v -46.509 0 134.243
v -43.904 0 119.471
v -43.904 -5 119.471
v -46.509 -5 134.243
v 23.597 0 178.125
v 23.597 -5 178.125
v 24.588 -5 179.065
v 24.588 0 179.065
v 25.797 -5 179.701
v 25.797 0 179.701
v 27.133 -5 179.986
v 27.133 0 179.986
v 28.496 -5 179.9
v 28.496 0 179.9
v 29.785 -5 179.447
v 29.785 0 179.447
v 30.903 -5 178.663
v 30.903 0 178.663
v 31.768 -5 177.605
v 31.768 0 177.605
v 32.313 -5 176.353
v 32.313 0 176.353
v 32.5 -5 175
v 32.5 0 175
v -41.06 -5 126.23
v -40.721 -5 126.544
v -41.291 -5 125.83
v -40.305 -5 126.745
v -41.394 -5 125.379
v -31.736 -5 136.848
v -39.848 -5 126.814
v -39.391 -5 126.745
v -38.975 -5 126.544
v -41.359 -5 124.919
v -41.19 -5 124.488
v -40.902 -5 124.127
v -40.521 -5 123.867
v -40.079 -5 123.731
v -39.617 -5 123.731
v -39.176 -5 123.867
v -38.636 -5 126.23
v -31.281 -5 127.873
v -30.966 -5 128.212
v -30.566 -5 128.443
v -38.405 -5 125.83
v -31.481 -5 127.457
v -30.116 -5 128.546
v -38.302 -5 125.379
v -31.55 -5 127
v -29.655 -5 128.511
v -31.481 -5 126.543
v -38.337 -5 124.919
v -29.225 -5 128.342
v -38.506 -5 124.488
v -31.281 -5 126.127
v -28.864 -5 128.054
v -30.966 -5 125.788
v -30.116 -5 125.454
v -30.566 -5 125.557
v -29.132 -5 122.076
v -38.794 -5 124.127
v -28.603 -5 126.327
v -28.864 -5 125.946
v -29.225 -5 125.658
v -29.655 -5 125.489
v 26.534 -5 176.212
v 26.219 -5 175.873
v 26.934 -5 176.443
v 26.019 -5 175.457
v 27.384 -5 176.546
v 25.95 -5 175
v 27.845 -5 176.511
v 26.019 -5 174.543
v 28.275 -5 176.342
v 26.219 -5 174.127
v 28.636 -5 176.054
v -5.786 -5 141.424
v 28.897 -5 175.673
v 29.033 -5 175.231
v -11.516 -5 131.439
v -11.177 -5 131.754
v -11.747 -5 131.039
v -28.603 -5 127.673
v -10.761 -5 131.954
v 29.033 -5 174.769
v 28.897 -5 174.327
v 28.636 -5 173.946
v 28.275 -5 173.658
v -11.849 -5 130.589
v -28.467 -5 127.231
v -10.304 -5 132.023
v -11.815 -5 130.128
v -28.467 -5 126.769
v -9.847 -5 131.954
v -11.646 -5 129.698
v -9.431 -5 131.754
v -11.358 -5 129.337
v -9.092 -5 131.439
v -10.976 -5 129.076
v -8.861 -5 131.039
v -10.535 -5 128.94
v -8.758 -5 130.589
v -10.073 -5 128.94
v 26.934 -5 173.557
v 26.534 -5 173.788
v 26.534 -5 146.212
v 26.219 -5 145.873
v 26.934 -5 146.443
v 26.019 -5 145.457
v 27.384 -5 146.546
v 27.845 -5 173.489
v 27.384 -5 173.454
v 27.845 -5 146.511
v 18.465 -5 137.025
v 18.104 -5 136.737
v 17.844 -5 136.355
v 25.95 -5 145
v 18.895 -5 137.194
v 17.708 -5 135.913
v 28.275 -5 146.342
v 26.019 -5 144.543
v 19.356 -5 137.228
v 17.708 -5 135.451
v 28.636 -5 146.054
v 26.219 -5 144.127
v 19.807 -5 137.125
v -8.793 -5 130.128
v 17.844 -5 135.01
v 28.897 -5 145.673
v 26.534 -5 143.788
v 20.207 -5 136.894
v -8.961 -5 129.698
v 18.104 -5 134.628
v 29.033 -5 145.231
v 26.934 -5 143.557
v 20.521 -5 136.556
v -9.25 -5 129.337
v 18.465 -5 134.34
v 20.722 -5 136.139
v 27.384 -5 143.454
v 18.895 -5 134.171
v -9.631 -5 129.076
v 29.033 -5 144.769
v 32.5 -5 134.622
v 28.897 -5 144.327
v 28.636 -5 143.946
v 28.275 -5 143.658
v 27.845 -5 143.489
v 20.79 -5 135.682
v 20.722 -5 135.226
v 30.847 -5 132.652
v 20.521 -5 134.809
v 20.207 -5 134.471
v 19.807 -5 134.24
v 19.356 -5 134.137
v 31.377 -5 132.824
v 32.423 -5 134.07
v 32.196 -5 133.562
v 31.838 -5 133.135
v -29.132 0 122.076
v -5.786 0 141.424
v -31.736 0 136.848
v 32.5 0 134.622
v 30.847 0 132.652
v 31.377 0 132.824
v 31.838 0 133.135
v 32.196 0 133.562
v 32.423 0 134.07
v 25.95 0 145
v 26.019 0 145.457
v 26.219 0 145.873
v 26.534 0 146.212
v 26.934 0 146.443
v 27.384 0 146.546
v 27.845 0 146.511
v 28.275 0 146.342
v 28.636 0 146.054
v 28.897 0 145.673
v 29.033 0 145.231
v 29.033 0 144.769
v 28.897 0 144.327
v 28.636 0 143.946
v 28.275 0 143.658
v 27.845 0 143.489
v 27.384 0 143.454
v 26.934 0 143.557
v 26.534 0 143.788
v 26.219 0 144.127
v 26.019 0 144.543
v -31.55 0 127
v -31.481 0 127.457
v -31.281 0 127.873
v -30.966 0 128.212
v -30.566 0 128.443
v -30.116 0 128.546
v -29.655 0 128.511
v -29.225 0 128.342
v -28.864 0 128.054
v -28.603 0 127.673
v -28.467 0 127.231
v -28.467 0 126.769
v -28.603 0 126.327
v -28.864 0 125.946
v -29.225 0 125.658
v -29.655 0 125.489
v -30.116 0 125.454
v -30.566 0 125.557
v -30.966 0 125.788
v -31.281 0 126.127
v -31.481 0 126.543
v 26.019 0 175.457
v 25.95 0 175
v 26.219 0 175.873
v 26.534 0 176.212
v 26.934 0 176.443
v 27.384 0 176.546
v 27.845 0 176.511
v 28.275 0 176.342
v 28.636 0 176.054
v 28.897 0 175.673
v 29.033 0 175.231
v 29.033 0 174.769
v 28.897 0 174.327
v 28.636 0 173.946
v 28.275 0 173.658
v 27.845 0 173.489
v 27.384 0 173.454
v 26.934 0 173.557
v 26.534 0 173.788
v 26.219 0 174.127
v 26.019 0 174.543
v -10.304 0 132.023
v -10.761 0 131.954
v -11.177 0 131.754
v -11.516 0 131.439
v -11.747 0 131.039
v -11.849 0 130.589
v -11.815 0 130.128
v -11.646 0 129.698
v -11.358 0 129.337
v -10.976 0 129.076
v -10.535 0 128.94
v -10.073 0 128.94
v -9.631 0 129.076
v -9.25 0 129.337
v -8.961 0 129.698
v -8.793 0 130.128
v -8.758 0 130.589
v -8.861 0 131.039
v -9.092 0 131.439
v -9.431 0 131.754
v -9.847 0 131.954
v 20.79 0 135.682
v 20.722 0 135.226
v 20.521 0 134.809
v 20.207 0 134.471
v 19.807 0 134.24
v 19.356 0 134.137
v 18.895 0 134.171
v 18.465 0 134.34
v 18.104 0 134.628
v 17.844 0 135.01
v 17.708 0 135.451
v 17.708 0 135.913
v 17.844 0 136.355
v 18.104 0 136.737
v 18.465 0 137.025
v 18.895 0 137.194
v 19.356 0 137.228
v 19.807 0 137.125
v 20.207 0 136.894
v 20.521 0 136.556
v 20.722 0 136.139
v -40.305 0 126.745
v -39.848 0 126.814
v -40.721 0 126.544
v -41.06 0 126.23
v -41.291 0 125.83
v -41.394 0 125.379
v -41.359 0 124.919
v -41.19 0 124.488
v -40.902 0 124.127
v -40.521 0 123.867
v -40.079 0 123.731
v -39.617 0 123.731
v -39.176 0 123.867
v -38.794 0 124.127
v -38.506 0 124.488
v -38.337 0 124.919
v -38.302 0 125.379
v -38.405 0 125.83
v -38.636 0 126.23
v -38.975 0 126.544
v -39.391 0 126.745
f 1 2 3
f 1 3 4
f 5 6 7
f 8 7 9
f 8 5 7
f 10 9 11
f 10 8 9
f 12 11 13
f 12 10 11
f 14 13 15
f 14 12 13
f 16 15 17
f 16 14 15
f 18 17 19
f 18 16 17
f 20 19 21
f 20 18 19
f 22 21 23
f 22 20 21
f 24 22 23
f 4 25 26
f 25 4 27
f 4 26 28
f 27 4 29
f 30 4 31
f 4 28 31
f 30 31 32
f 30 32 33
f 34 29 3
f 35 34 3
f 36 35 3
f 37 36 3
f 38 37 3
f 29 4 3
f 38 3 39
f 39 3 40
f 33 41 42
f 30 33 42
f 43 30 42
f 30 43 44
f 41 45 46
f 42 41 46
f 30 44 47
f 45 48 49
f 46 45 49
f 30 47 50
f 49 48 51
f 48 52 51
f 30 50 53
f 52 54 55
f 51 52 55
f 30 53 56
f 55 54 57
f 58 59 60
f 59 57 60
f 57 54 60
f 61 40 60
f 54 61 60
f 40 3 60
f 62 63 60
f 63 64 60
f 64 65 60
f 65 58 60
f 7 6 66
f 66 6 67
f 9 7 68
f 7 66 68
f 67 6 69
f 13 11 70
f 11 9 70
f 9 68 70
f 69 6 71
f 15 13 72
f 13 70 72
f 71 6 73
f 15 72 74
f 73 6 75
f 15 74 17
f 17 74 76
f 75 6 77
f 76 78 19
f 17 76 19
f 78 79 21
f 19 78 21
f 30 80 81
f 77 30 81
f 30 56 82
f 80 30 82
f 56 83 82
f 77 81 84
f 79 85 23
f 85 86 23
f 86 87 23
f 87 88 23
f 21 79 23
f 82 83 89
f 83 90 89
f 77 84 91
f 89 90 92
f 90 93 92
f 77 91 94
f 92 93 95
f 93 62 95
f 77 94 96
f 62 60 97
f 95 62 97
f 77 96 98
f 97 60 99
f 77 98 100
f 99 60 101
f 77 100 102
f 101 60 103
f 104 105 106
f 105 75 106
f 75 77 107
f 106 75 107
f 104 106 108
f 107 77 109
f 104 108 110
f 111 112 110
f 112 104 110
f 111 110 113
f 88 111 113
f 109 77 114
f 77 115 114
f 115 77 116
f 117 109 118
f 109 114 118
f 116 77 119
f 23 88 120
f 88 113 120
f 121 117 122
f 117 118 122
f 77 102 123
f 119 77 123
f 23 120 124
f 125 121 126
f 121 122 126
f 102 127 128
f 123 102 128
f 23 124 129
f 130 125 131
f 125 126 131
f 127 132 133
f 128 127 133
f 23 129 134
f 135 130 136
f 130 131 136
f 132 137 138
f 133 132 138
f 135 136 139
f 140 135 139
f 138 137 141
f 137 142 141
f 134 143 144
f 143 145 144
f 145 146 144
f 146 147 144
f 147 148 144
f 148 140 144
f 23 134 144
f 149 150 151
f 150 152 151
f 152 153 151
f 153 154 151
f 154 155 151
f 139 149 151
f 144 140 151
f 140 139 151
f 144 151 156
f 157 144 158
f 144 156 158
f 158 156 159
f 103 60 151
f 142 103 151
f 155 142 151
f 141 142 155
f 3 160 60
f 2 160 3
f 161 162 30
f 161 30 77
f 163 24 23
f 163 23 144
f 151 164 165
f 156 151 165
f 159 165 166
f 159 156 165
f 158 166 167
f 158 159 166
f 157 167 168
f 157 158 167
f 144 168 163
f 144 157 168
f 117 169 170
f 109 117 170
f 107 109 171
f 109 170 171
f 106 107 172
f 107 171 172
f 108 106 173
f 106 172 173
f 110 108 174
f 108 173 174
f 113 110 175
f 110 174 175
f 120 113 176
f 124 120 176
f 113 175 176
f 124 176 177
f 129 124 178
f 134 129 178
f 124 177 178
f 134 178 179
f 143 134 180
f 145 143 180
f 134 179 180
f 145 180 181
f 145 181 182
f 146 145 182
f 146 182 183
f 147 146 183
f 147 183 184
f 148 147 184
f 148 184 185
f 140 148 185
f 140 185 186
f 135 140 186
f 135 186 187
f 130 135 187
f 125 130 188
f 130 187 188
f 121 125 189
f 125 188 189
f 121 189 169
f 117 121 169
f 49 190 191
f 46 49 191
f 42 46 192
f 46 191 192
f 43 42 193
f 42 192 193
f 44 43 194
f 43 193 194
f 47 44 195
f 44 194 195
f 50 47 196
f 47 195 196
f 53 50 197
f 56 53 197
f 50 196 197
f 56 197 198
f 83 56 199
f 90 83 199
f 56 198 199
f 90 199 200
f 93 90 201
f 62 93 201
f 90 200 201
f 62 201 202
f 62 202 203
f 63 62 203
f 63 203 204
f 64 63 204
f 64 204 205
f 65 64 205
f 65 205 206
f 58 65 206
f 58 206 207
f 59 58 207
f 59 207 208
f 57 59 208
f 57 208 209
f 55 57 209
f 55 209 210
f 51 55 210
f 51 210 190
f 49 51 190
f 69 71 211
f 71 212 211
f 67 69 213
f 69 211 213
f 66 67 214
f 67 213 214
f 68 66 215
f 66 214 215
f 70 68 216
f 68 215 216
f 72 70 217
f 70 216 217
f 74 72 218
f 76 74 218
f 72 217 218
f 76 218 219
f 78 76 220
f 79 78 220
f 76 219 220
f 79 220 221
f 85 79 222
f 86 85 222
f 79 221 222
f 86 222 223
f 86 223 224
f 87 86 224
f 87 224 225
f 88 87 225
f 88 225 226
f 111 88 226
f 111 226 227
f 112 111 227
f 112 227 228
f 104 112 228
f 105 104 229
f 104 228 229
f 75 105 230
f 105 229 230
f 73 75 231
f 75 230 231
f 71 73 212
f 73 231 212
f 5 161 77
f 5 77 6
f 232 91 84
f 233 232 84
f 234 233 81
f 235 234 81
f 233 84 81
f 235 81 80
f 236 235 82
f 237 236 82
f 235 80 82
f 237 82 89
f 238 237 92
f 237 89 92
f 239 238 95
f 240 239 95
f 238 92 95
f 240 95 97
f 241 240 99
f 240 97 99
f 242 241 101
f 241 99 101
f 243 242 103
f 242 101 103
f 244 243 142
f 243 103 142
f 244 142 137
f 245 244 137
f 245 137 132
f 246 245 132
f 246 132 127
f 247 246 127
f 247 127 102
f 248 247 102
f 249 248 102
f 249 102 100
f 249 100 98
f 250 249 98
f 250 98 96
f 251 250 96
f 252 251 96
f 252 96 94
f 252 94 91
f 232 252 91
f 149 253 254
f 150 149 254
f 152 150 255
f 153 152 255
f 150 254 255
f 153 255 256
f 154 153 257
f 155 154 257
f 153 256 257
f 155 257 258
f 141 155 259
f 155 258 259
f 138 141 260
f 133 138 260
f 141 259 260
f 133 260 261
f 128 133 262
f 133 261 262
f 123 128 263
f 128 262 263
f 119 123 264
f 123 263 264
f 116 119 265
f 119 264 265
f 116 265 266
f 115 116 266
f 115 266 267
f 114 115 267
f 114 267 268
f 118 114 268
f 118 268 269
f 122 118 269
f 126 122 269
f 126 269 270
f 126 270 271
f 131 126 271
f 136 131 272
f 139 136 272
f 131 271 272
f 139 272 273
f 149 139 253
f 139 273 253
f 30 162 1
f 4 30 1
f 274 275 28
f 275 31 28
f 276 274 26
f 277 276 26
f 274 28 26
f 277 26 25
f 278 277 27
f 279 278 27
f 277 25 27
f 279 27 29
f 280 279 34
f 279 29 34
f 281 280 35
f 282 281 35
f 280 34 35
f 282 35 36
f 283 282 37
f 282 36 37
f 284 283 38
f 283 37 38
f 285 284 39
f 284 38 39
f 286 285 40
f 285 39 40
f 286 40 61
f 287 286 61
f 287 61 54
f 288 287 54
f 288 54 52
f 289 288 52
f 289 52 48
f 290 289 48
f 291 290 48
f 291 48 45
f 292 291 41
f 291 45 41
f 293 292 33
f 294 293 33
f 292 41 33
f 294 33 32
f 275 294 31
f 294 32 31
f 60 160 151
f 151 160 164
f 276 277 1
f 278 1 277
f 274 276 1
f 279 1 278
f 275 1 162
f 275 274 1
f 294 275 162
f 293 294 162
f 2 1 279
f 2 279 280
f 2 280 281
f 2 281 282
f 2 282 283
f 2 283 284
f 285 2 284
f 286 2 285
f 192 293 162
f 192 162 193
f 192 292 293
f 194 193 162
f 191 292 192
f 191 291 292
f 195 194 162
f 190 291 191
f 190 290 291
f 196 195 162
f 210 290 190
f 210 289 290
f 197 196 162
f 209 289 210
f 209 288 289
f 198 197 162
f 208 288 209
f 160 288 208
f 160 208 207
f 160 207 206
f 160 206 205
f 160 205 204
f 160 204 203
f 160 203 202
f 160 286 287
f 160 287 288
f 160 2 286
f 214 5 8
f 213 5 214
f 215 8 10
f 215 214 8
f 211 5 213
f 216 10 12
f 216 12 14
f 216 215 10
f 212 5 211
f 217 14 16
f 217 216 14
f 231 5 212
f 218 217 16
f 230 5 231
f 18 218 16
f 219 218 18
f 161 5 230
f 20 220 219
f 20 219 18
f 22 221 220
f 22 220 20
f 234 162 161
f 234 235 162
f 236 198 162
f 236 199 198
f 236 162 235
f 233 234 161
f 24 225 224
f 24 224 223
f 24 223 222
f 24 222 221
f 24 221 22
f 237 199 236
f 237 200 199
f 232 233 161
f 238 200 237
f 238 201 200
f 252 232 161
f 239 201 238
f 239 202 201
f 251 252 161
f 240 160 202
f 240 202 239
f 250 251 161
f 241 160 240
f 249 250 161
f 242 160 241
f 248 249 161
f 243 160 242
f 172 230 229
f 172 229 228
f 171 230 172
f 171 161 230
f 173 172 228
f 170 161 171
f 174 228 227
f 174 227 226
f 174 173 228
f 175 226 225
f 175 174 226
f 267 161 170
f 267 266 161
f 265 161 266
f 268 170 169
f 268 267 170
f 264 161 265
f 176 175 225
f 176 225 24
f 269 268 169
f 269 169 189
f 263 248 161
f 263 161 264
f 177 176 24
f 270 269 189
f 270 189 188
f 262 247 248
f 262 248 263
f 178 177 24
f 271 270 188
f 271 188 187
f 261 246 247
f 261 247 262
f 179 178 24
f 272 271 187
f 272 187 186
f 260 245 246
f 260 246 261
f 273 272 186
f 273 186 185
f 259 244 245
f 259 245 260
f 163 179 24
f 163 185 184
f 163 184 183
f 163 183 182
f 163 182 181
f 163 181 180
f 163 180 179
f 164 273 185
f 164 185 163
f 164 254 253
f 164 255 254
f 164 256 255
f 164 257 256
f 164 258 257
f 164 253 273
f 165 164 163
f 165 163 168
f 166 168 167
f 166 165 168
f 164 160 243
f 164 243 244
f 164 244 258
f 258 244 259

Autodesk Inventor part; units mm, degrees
ref_plane "YZ Plane" through (0, 0, 0) normal (1, 0, 0) x (0, 1, 0)
ref_plane "XZ Plane" through (0, 0, 0) normal (0, 1, 0) x (-1, 0, 0)
ref_plane "XY Plane" through (0, 0, 0) normal (0, 0, 1) x (1, 0, 0)
sketch "スケッチ1" plane through (0, 0, 0) normal (0, 1, 0) x (-1, 0, 0)
  circle A0 centre (0, 0) radius 122.5
  line L0 (0, 0) -> (21.2719, 120.6389)
  line L1 (21.2719, 120.6389) -> (-21.2719, -120.6389)
  line L2 (21.2719, 120.6389) -> (-41.166, -233.4643)
  arc A1 (21.2719, 120.6389) -> (0, 122.5) centre (0, 0) ccw
  arc A2 (-21.2719, -120.6389) -> (0, -122.5) centre (0, 0) ccw
  arc A3 (-41.8975, -115.1123) -> (-21.2719, -120.6389) centre (0, 0) ccw
  circle A4 centre (0, 0) radius 125
  circle A5 centre (0, 0) radius 145
  arc A6 (-42.7525, -117.4616) -> (-105.9051, -66.4011) centre (0, 0) ccw
  line L3 (0, 0) -> (-42.7525, -117.4616) construction
  line L4 (21.706, 123.101) -> (21.706, 123.101)
  line L5 (0, -145) -> (0, -265.735)
  line L6 (0, 0) -> (-41.8975, -115.1123)
  line L7 (-49.5929, -136.2554) -> (-41.8975, -115.1123)
  line L8 (-42.7525, -117.4616) -> (-231.4975, -48.764)
  line L9 (42.7525, 117.4616) -> (0, 0)
  line L10 (0, -145) -> (0, 145)
  line L11 (0, 0) -> (0, 300)
  circle A7 centre (0, 300) radius 20
  line L12 (117.0937, 43.75) -> (18.735, 307)
  line L13 (0, 0) -> (185.4327, 0)
  line L14 (0, 0) -> (-259.4726, 94.4403)
  line L15 (42.7525, 117.4616) -> (-253.7236, 225.3701)
  line L16 (0, 125) -> (22.0409, 125)
  line L17 (21.2719, 120.6389) -> (25.179, 142.7971)
  line L18 (42.7525, 117.4616) -> (65.8461, 180.9106)
  line L19 (15, 170) -> (69.9226, 170)
  line L20 (15.9946, 175) -> (68.0545, 175)
  line L21 (0, 125) -> (-15, 125)
  line L22 (-15, 125) -> (-15, 325)
  line L23 (-15, 325) -> (0, 325)
  line L24 (0, 325) -> (0, 125)
  line L25 (0, 125) -> (15, 125)
  line L26 (15, 125) -> (15, 325)
  line L27 (15, 325) -> (0, 325)
  line L28 (0, 325) -> (0, 125)
  line L29 (15, 200) -> (15, 325)
  line L30 (15, 325) -> (-15, 325)
  line L31 (-15, 325) -> (-15, 150)
  line L32 (15, 170) -> (37.5, 170)
  line L33 (37.5, 170) -> (17.5, 170)
  line L34 (0, 0) -> (0, 300)
  line L35 (0, -125) -> (42.7525, 117.4616)
  line L36 (-42.7525, -117.4616) -> (0, 125)
  line L37 (0, -125) -> (-3.519, -144.9573)
  line L38 (42.7525, 117.4616) -> (49.5929, 136.2554)
  line L39 (0, 125) -> (3.519, 144.9573)
  line L40 (-42.7525, -117.4616) -> (-46.2715, -137.4189)
  line L41 (42.7525, 117.4616) -> (46.2715, 137.4189)
  line L42 (-3.519, -144.9573) -> (46.2715, 137.4189)
  line L43 (46.2715, 137.4189) -> (37.2054, 139.0175)
  line L44 (-12.5852, -143.3587) -> (-3.519, -144.9573)
  line L45 (-46.2715, -137.4189) -> (3.519, 144.9573)
  line L46 (3.519, 144.9573) -> (12.5852, 143.3587)
  line L47 (-37.2054, -139.0175) -> (-46.2715, -137.4189)
  line L48 (-27.6373, -142.3418) -> (-22.7132, -143.21)
  line L49 (-27.6373, -142.3418) -> (-22.7132, -143.21)
  line L50 (-22.7132, -143.21) -> (27.641, 142.363)
  line L51 (27.641, 142.363) -> (22.717, 143.2312)
  line L52 (22.717, 143.2312) -> (-27.6373, -142.3418)
  line L53 (12.5852, 143.3587) -> (-37.2054, -139.0175)
  line L54 (-12.5852, -143.3587) -> (37.2054, 139.0175)
  line L55 (-42.1294, -138.1492) -> (7.6611, 144.2269)
  line L56 (-7.6611, -144.2269) -> (42.1294, 138.1492)
  line L57 (12.5852, 143.3587) -> (7.6611, 144.2269)
  line L58 (7.6611, 144.2269) -> (29.236, 266.5842)
  line L59 (29.236, 266.5842) -> (34.1601, 265.7159)
  line L60 (34.1601, 265.7159) -> (12.5852, 143.3587)
  line L61 (22.717, 143.2312) -> (25.179, 142.7971)
  line L62 (25.179, 142.7971) -> (42.462, 240.8141)
  line L63 (42.462, 240.8141) -> (40, 241.2482)
  line L64 (40, 241.2482) -> (22.717, 143.2312)
  line L65 (42.1294, 138.1492) -> (37.2054, 139.0175)
  line L66 (37.2054, 139.0175) -> (49.9319, 211.1932)
  line L67 (49.9319, 211.1932) -> (54.8559, 210.3249)
  line L68 (54.8559, 210.3249) -> (42.1294, 138.1492)
  line L69 (25.179, 142.7971) -> (27.641, 142.363)
  line L70 (27.641, 142.363) -> (44.508, 238.0204)
  line L71 (44.508, 238.0204) -> (42.046, 238.4546)
  line L72 (42.046, 238.4546) -> (25.179, 142.7971)
  line L73 (15.9946, 175) -> (15, 175)
  line L74 (15, 175) -> (0, 175)
  line L75 (0, 175) -> (0, 170)
  line L76 (0, 170) -> (15, 170)
  line L77 (15, 170) -> (15, 175)
  line L78 (20, 175) -> (40, 175)
  line L79 (40, 175) -> (40, 245)
  line L80 (40, 245) -> (20, 245)
  line L81 (20, 245) -> (20, 175)
  line L82 (0, 175) -> (58.7137, 175)
  line L83 (58.7137, 175) -> (58.7137, 200)
  line L84 (58.7137, 200) -> (0, 200)
  line L85 (0, 200) -> (0, 175)
  line L86 (0, 200) -> (50, 200)
  line L87 (50, 200) -> (50, 170)
  line L88 (50, 170) -> (0, 170)
  line L89 (0, 170) -> (0, 200)
  line L90 (50, 170) -> (0, 170)
  line L91 (0, 170) -> (0, 165)
  line L92 (0, 200) -> (-15, 200)
  line L93 (-15, 200) -> (-15, 180)
  line L94 (-15, 180) -> (0, 180)
  line L95 (0, 180) -> (0, 200)
  line L96 (0, 180) -> (-15, 180)
  line L97 (-15, 180) -> (-15, 175)
  line L98 (-15, 175) -> (0, 175)
  line L99 (0, 175) -> (0, 180)
  line L100 (0, 145) -> (-15, 145)
  line L101 (-15, 145) -> (-20.5, 145)
  line L102 (-20.5, 145) -> (-20.5, 200)
  line L103 (-20.5, 200) -> (-15, 200)
  line L104 (-15, 200) -> (-15, 145)
  line L105 (-20.5, 150) -> (-25, 150)
  line L106 (-25, 150) -> (-25, 180)
  line L107 (-25, 180) -> (-20.5, 180)
  line L108 (-20.5, 180) -> (-20.5, 150)
  line L109 (50, 175) -> (-15, 175)
  line L110 (-15, 175) -> (-15, 170)
  line L111 (50, 170) -> (50, 175)
  line L112 (-20.5, 170) -> (-25, 170)
  line L113 (-25, 170) -> (-25, 200)
  line L114 (-25, 200) -> (-20.5, 200)
  line L115 (-20.5, 200) -> (-20.5, 170)
  line L116 (15, 250) -> (-15, 250)
  line L117 (-15, 145) -> (15, 145)
  line L118 (31.698, 266.1501) -> (-39.6674, -138.5834)
  line L119 (52.3939, 210.7591) -> (-10.1232, -143.7928)
  line L120 (49.3441, 179.0659) -> (14.8758, 185.1436)
  line L121 (-15, 138.4818) -> (-15, 121.5782)
  line L122 (-7.6611, -144.2269) -> (-42.1294, -138.1492)
  line L123 (-39.6243, -123.9424) -> (-5.1561, -130.02)
  line L124 (-42.2291, -138.7145) -> (-7.7608, -144.7922)
  line L125 (-41.3608, -133.7904) -> (-6.8926, -139.8681)
  line L126 (-6.0243, -134.9441) -> (-40.4926, -128.8664)
  line L127 (18.3488, 204.8397) -> (52.8171, 198.762)
  line L128 (50.2124, 183.9899) -> (45.0029, 154.4457)
  line L129 (10.5346, 160.5234) -> (15.7441, 190.0676)
  line L130 (19.217, 209.7638) -> (53.6853, 203.6861)
  line L131 (15, 250) -> (53.6853, 203.6861)
  line L132 (53.6853, 203.6861) -> (53.6853, 170)
  line L133 (53.6853, 170) -> (-15, 170)
  line L134 (-15, 172.5) -> (53.6853, 172.5)
  line L135 (15, 170) -> (15, 150)
  line L136 (15, 150) -> (-15, 150)
  line L137 (-15, 170) -> (15, 170)
  line L138 (15, 150) -> (-15, 150)
  line L139 (-15, 150) -> (-15, 325)
  line L140 (-15, 325) -> (15, 325)
  line L141 (15, 325) -> (15, 150)
  circle A8 centre (0, 300) radius 6
  circle A9 centre (0, 300) radius 11
  line L142 (47.7456, 170) -> (15, 150)
  line L143 (-25, 170) -> (-30, 170)
  line L144 (-30, 170) -> (-30, 140)
  line L145 (-30, 140) -> (-25, 140)
  line L146 (-25, 140) -> (-25, 170)
  line L147 (30, 175) -> (30, 118.7697)
  line L148 (30, 147) -> (30, 132)
  line L149 (-30, 170) -> (-25, 170)
  line L150 (-25, 170) -> (-25, 180)
  line L151 (-25, 180) -> (-30, 180)
  line L152 (-30, 180) -> (-30, 170)
  circle A10 centre (30, 127) radius 1.55
  line L153 (-27.5, 140) -> (-27.5, 180)
  circle A11 centre (-27.5, 145) radius 1.55
  circle A12 centre (-27.5, 175) radius 1.55
  circle A13 centre (-27.5, 145) radius 5
  circle A14 centre (-27.5, 175) radius 5
  circle A15 centre (30, 127) radius 5
  line L154 (28.5063, 122.2283) -> (-28.9937, 140.2283)
  line L155 (-32.5, 145) -> (-32.5, 175)
  line L156 (-24.2958, 178.8384) -> (33.2042, 130.8384)
  line L157 (0, -125) -> (227.9227, -125)
  line L158 (0, 125) -> (227.9227, 125)
  point P0 (-25.1752, -142.7759)
  point P1 (42.3116, 114.9608)
  point P2 (0, 133.0222)
  point P3 (-38.8988, -134.2246)
  point P4 (-38.0306, -129.3005)
  point P5 (-23.2585, -131.9052)
  point P6 (-24.1267, -136.8293)
  point P7 (-9.3546, -139.434)
  point P8 (-8.4863, -134.51)
  point P9 (17.3379, 184.7094)
  point P10 (32.11, 182.1047)
  point P11 (46.8821, 179.5)
  point P12 (50.3551, 199.1962)
  point P13 (35.5829, 201.8009)
  point P14 (20.8108, 204.4056)
  point P15 (0, 240)
  point P16 (0, 190)
  point P17 (0, 289)
  point P18 (0, 311)
  point P19 (37.5, 172.5)
  point P20 (22.5, 172.5)
  point P21 (0, 125)
  point P22 (0, 122.5)
  point P23 (38.2879, 116.3628)
  point P24 (38.7264, 118.8498)
  point P25 (42.3116, 114.9608)
  point P26 (30, 122)
  point P27 (30, 137)
  point P28 (30, 122)
  point P29 (17.511, 143.9387)
  point P30 (15, 144.2221)
  point P31 (15, 146.0349)
  dimension "d0" = 245
  dimension "d7" = 290
  dimension "d19" = 40
  dimension "d1" = 0
  dimension "d4" = 42.5438
  dimension "d5" = 21.3532
  dimension "d6" = 250
  dimension "d10" = 0
  dimension "d12" = 0
  dimension "d13" = 10
  dimension "d15" = 0
  dimension "d16" = 9.8877
  dimension "d18" = 10
  dimension "d21" = 145
  dimension "d23" = 175
  dimension "d26" = 7.5384
  dimension "d30" = 180
  dimension "d34" = 180
  dimension "d35" = 45
  dimension "d37" = 5
  dimension "d38" = 15
  dimension "d39" = 200
  dimension "d40" = 15
  dimension "d41" = 200
  dimension "d47" = 300
  dimension "d52" = 5
  dimension "d53" = 0
  dimension "d54" = 10
  dimension "d55" = 10
  dimension "d56" = 5
  dimension "d57" = 5
  dimension "d60" = 5
  dimension "d61" = 20
  dimension "d62" = 70
  dimension "d63" = 5
  dimension "d65" = 25
  dimension "d66" = 50
  dimension "d68" = 20
  dimension "d69" = 5
  dimension "d74" = 20
  dimension "d75" = 5.5
  dimension "d76" = 55
  dimension "d77" = 4.5
  dimension "d78" = 30
  dimension "d79" = 5
  dimension "d82" = 20
  dimension "d83" = 50
  dimension "d87" = 16.9036
  dimension "d88" = 10.0392
  dimension "d89" = 10.5222
  dimension "d92" = 15
  dimension "d93" = 5
  dimension "d94" = 5
  dimension "d96" = 4.5
  dimension "d97" = 5
  dimension "d98" = 30
  dimension "d99" = 10
  dimension "d101" = 20
  dimension "d102" = 10
  dimension "d103" = 20
  dimension "d104" = 12
  dimension "d105" = 22
  dimension "d106" = 7.5
  dimension "d107" = 15
  dimension "d108" = 30
  dimension "d112" = 5
  dimension "d122" = 10
extrude "押し出し2" add sketch "スケッチ1" against normal blind 5 contours A15 L147 L15 | L15 L147 L158 A15 | A15 L15 L147 | L15 A15 L158 L147 | L158 L147 A10 A15 | L154 L17 L15 L50 | L50 L15 A15 L154 | L15 L50 L158 A15 | L158 A15 L50 L147 A10 | L154 L16 L17 | L15 L158 L50 | L158 L50 A15 | A15 L147 L156 | L147 A15 L50 L156 | L16 L154 L52 L15 | L15 L52 L156 L17 | L17 L156 L50 A15 L158 | A15 L50 | L154 L26 L15 L52 | L15 L26 A5 L156 L52 | L154 L118 L15 L53 | L53 L15 L26 L154 | L15 L53 L60 A5 L26 | A5 L26 L156 | L154 L55 L15 L118 | L15 L118 L46 L53 | A5 L60 L117 L26 | L26 L117 L60 L156 | A13 L15 L144 A5 | A5 L144 A13 | L154 L22 L15 L10 | L10 L15 L39 L154 | L39 L15 L55 L154 | L15 L55 L46 L118 | L46 L118 A5 L60 | A5 L118 L117 L60 | L60 L117 L118 L156 | L144 L15 L153 A5 | A5 L153 A13 L144 | A13 L144 L15 | L15 L22 A5 L10 | L10 A5 L39 L15 | L154 L145 L146 A13 L15 L22 | L39 L46 L55 L15 | L46 L58 A5 L118 | A5 L58 L117 L118 | L118 L117 L58 L136 L156 | L153 L15 A5 | A5 L15 L146 A13 L153 | L144 A13 L153 A11 L15 | L155 A14 L152 L144 A13 | A13 L145 L154 | L117 L58 A5 | L100 L22 L136 L11 | A5 L22 L100 | L11 L136 L58 L117 | L15 A13 A5 L22 | A5 L58 L46 | L136 L58 L156 | L15 L153 A11 A13 L146 A5 | A5 L146 L15 | A13 L146 L145 | L144 L143 L153 A13 | A14 L152 | A5 A13 L146 L105 L102 L101 L22 | L136 L22 L133 L156 L11 | L11 L156 L58 L136 | L101 L102 L156 L22 | A13 L146 L15 | L15 L146 A5 A13 | L146 A13 A5 | L152 A14 L143 | L153 L143 L106 L146 A13 | A14 L153 A12 L152 | A14 L106 L143 | L153 A12 A14 L106 | L133 L22 L156 | L105 L106 L112 L102 | L106 A14 L156 L102 L112 | L106 A14
sketch "スケッチ3" plane through (0, 0, 0) normal (0, 1, 0) x (1, 0, 0)
  arc A0 (24.2958, -178.8384) -> (32.5, -175) centre (27.5, -175) ccw projected
  line L0 (32.5, -175) -> (32.5, -145) projected
  arc A1 (32.5, -145) -> (28.9937, -140.2283) centre (27.5, -145) ccw projected
  line L1 (28.9937, -140.2283) -> (-28.5063, -122.2283) projected
  arc A2 (-28.5063, -122.2283) -> (-33.2042, -130.8384) centre (-30, -127) ccw projected
  line L2 (-33.2042, -130.8384) -> (24.2958, -178.8384) projected
  circle A3 centre (-30, -127) radius 1.55 projected
  circle A4 centre (27.5, -175) radius 1.55 projected
  circle A5 centre (27.5, -145) radius 1.55 projected
  circle A6 centre (-30, -127) radius 5
  circle A7 centre (27.5, -145) radius 5
  line L3 (26.0063, -149.7717) -> (-31.4937, -131.7717)
  circle A8 centre (27.5, -175) radius 5
  line L4 (22.5, -175) -> (22.5, -145)
  line L5 (-7.5, -139.2827) -> (23.5968, -178.1249)
  point P0 (0, 0)
  point P1 (24.2958, -178.8384)
  dimension "d138" = 40
extrude "押し出し3" cut sketch "スケッチ3" against normal blind 5 contours L2 A6 L3 L5 A8
sketch "スケッチ4" plane through (0, 0, 0) normal (0, 1, 0) x (1, 0, 0)
  arc A0 (-28.5063, -122.2283) -> (-31.4937, -131.7717) centre (-30, -127) ccw projected
  line L0 (-29.1318, -122.076) -> (32.5, -132.9433)
  circle A1 centre (-30, -127) radius 1.55 projected
  line L1 (-30, -127) -> (-13.2635, -127)
  line L2 (-28.5063, -122.2283) -> (28.9937, -140.2283) projected
  arc A2 (-28.5063, -122.2283) -> (-31.4937, -131.7717) centre (-30, -127) ccw projected
  arc A3 (32.5, -145) -> (28.9937, -140.2283) centre (27.5, -145) ccw projected
  line L3 (32.5, -145) -> (32.5, -132.9433)
  point P0 (0, 0)
  dimension "d141" = 10
extrude "押し出し4" add sketch "スケッチ4" against normal blind 5 contours A0 L0 L3 A3 L2
fillet "フィレット1" radius 2 1 edges at (32.5, -2.5, 132.9433)
sketch "スケッチ6" plane through (0, 0, 0) normal (0, 1, 0) x (1, 0, 0)
  circle A0 centre (27.5, -145) radius 1.55 projected
  circle A1 centre (19.2404, -135.6824) radius 1.55
  line L0 (32.5, -175) -> (32.5, -134.6215) projected
  line L1 (30.8473, -132.6519) -> (-29.1318, -122.076) projected
  circle A2 centre (-30, -127) radius 1.55 projected
  point P0 (0, 0)
  dimension "d148" = 3.1
  dimension "d152" = 5
  dimension "d160" = 50
extrude "押し出し6" cut sketch "スケッチ6" against normal blind 5 contours A1
sketch "スケッチ7" plane through (0, 0, 0) normal (0, 1, 0) x (1, 0, 0)
  arc A0 (-29.1318, -122.076) -> (-31.4937, -131.7717) centre (-30, -127) ccw projected
  circle A1 centre (-30, -127) radius 1.55 projected
  line L0 (-30, -127) -> (-30.554, -130.1418)
  line L1 (30.8473, -132.6519) -> (-29.1318, -122.076) projected
  line L2 (-34.924, -126.1318) -> (-35.7923, -131.0558)
  arc A2 (-35.7923, -131.0558) -> (-31.7365, -136.8481) centre (-30.8682, -131.924) ccw
  line L3 (-31.7365, -136.8481) -> (5.9503, -143.4933)
  line L4 (-7.5, -139.2827) -> (-31.4937, -131.7717) projected
  line L5 (-7.5, -139.2827) -> (23.5968, -178.1249) projected
  point P0 (0, 0)
  point P1 (-5.7858, -141.4239)
  dimension "d155" = 90
  dimension "d156" = 5
  dimension "d157" = 5
extrude "押し出し7" add sketch "スケッチ7" against normal blind 5 contours A0 L4 L5 L3 A2 L2
sketch "スケッチ8" plane through (0, 0, 0) normal (0, 1, 0) x (1, 0, 0)
  line L0 (-29.1318, -122.076) -> (30.8473, -132.6519) projected
  line L1 (-29.1318, -122.076) -> (-43.9039, -119.4712)
  line L2 (-43.9039, -119.4712) -> (-46.5086, -134.2434)
  line L3 (-5.7858, -141.4239) -> (-31.7365, -136.8481) projected
  line L4 (-31.7365, -136.8481) -> (-46.5086, -134.2434)
  line L5 (-34.924, -126.1318) -> (-35.7923, -131.0558) projected
  circle A0 centre (19.2404, -135.6824) radius 1.55 projected
  arc A1 (32.5, -134.6215) -> (30.8473, -132.6519) centre (30.5, -134.6215) ccw projected
  line L6 (30.8473, -132.6519) -> (-29.1318, -122.076) projected
  arc A2 (-29.1318, -122.076) -> (-34.924, -126.1318) centre (-30, -127) ccw projected
  line L7 (-34.924, -126.1318) -> (-35.7923, -131.0558) projected
  arc A3 (-35.7923, -131.0558) -> (-31.7365, -136.8481) centre (-30.8682, -131.924) ccw projected
  line L8 (-31.7365, -136.8481) -> (-5.7858, -141.4239) projected
  line L9 (-5.7858, -141.4239) -> (23.5968, -178.1249) projected
  arc A4 (23.5968, -178.1249) -> (32.5, -175) centre (27.5, -175) ccw projected
  line L10 (32.5, -175) -> (32.5, -134.6215) projected
  circle A5 centre (-30, -127) radius 1.55 projected
  circle A6 centre (27.5, -175) radius 1.55 projected
  circle A7 centre (27.5, -145) radius 1.55 projected
  point P0 (0, 0)
  dimension "d161" = 10
extrude "押し出し8" add sketch "スケッチ8" against normal blind 5 contours A2 L5 A3 L4 L2 L1
sketch "スケッチ9" plane through (0, 0, 0) normal (0, 1, 0) x (1, 0, 0)
  circle A0 centre (19.2404, -135.6824) radius 1.55 projected
  line L0 (19.2404, -135.6824) -> (-44.7721, -124.3953)
  line L1 (-46.5086, -134.2434) -> (-43.9039, -119.4712) projected
  circle A1 centre (-30, -127) radius 1.55 projected
  point P0 (0, 0)
  point P1 (-46.1613, -132.2737)
  point P2 (-44.2512, -121.4409)
  point P3 (-10.3038, -130.473)
  point P4 (-39.8481, -125.2635)
  dimension "d165" = 90
  dimension "d166" = 20
  dimension "d167" = 10
hole "穴1" at (-10.3038, 0, 130.473) at (-39.8481, 0, 125.2635) direction (0, -1, 0) diameter 3.1 end through all
sketch "スケッチ10" plane through (0, 0, 0) normal (0, 1, 0) x (1, 0, 0)
  line L0 (-43.9039, -119.4712) -> (30.8473, -132.6519) projected
  line L1 (-43.9039, -119.4712) -> (-66.5086, -119.4712)
  line L2 (-5.7858, -141.4239) -> (-46.5086, -134.2434) projected
  line L3 (-46.5086, -134.2434) -> (-66.5086, -134.2434)
  line L4 (-66.5086, -119.4712) -> (-66.5086, -134.2434)
  point P0 (0, 0)
  dimension "d175" = 20
equation "\"d18\" = d13"
properties part number "hand2_10" material "アルミニウム 6061-AHC"
